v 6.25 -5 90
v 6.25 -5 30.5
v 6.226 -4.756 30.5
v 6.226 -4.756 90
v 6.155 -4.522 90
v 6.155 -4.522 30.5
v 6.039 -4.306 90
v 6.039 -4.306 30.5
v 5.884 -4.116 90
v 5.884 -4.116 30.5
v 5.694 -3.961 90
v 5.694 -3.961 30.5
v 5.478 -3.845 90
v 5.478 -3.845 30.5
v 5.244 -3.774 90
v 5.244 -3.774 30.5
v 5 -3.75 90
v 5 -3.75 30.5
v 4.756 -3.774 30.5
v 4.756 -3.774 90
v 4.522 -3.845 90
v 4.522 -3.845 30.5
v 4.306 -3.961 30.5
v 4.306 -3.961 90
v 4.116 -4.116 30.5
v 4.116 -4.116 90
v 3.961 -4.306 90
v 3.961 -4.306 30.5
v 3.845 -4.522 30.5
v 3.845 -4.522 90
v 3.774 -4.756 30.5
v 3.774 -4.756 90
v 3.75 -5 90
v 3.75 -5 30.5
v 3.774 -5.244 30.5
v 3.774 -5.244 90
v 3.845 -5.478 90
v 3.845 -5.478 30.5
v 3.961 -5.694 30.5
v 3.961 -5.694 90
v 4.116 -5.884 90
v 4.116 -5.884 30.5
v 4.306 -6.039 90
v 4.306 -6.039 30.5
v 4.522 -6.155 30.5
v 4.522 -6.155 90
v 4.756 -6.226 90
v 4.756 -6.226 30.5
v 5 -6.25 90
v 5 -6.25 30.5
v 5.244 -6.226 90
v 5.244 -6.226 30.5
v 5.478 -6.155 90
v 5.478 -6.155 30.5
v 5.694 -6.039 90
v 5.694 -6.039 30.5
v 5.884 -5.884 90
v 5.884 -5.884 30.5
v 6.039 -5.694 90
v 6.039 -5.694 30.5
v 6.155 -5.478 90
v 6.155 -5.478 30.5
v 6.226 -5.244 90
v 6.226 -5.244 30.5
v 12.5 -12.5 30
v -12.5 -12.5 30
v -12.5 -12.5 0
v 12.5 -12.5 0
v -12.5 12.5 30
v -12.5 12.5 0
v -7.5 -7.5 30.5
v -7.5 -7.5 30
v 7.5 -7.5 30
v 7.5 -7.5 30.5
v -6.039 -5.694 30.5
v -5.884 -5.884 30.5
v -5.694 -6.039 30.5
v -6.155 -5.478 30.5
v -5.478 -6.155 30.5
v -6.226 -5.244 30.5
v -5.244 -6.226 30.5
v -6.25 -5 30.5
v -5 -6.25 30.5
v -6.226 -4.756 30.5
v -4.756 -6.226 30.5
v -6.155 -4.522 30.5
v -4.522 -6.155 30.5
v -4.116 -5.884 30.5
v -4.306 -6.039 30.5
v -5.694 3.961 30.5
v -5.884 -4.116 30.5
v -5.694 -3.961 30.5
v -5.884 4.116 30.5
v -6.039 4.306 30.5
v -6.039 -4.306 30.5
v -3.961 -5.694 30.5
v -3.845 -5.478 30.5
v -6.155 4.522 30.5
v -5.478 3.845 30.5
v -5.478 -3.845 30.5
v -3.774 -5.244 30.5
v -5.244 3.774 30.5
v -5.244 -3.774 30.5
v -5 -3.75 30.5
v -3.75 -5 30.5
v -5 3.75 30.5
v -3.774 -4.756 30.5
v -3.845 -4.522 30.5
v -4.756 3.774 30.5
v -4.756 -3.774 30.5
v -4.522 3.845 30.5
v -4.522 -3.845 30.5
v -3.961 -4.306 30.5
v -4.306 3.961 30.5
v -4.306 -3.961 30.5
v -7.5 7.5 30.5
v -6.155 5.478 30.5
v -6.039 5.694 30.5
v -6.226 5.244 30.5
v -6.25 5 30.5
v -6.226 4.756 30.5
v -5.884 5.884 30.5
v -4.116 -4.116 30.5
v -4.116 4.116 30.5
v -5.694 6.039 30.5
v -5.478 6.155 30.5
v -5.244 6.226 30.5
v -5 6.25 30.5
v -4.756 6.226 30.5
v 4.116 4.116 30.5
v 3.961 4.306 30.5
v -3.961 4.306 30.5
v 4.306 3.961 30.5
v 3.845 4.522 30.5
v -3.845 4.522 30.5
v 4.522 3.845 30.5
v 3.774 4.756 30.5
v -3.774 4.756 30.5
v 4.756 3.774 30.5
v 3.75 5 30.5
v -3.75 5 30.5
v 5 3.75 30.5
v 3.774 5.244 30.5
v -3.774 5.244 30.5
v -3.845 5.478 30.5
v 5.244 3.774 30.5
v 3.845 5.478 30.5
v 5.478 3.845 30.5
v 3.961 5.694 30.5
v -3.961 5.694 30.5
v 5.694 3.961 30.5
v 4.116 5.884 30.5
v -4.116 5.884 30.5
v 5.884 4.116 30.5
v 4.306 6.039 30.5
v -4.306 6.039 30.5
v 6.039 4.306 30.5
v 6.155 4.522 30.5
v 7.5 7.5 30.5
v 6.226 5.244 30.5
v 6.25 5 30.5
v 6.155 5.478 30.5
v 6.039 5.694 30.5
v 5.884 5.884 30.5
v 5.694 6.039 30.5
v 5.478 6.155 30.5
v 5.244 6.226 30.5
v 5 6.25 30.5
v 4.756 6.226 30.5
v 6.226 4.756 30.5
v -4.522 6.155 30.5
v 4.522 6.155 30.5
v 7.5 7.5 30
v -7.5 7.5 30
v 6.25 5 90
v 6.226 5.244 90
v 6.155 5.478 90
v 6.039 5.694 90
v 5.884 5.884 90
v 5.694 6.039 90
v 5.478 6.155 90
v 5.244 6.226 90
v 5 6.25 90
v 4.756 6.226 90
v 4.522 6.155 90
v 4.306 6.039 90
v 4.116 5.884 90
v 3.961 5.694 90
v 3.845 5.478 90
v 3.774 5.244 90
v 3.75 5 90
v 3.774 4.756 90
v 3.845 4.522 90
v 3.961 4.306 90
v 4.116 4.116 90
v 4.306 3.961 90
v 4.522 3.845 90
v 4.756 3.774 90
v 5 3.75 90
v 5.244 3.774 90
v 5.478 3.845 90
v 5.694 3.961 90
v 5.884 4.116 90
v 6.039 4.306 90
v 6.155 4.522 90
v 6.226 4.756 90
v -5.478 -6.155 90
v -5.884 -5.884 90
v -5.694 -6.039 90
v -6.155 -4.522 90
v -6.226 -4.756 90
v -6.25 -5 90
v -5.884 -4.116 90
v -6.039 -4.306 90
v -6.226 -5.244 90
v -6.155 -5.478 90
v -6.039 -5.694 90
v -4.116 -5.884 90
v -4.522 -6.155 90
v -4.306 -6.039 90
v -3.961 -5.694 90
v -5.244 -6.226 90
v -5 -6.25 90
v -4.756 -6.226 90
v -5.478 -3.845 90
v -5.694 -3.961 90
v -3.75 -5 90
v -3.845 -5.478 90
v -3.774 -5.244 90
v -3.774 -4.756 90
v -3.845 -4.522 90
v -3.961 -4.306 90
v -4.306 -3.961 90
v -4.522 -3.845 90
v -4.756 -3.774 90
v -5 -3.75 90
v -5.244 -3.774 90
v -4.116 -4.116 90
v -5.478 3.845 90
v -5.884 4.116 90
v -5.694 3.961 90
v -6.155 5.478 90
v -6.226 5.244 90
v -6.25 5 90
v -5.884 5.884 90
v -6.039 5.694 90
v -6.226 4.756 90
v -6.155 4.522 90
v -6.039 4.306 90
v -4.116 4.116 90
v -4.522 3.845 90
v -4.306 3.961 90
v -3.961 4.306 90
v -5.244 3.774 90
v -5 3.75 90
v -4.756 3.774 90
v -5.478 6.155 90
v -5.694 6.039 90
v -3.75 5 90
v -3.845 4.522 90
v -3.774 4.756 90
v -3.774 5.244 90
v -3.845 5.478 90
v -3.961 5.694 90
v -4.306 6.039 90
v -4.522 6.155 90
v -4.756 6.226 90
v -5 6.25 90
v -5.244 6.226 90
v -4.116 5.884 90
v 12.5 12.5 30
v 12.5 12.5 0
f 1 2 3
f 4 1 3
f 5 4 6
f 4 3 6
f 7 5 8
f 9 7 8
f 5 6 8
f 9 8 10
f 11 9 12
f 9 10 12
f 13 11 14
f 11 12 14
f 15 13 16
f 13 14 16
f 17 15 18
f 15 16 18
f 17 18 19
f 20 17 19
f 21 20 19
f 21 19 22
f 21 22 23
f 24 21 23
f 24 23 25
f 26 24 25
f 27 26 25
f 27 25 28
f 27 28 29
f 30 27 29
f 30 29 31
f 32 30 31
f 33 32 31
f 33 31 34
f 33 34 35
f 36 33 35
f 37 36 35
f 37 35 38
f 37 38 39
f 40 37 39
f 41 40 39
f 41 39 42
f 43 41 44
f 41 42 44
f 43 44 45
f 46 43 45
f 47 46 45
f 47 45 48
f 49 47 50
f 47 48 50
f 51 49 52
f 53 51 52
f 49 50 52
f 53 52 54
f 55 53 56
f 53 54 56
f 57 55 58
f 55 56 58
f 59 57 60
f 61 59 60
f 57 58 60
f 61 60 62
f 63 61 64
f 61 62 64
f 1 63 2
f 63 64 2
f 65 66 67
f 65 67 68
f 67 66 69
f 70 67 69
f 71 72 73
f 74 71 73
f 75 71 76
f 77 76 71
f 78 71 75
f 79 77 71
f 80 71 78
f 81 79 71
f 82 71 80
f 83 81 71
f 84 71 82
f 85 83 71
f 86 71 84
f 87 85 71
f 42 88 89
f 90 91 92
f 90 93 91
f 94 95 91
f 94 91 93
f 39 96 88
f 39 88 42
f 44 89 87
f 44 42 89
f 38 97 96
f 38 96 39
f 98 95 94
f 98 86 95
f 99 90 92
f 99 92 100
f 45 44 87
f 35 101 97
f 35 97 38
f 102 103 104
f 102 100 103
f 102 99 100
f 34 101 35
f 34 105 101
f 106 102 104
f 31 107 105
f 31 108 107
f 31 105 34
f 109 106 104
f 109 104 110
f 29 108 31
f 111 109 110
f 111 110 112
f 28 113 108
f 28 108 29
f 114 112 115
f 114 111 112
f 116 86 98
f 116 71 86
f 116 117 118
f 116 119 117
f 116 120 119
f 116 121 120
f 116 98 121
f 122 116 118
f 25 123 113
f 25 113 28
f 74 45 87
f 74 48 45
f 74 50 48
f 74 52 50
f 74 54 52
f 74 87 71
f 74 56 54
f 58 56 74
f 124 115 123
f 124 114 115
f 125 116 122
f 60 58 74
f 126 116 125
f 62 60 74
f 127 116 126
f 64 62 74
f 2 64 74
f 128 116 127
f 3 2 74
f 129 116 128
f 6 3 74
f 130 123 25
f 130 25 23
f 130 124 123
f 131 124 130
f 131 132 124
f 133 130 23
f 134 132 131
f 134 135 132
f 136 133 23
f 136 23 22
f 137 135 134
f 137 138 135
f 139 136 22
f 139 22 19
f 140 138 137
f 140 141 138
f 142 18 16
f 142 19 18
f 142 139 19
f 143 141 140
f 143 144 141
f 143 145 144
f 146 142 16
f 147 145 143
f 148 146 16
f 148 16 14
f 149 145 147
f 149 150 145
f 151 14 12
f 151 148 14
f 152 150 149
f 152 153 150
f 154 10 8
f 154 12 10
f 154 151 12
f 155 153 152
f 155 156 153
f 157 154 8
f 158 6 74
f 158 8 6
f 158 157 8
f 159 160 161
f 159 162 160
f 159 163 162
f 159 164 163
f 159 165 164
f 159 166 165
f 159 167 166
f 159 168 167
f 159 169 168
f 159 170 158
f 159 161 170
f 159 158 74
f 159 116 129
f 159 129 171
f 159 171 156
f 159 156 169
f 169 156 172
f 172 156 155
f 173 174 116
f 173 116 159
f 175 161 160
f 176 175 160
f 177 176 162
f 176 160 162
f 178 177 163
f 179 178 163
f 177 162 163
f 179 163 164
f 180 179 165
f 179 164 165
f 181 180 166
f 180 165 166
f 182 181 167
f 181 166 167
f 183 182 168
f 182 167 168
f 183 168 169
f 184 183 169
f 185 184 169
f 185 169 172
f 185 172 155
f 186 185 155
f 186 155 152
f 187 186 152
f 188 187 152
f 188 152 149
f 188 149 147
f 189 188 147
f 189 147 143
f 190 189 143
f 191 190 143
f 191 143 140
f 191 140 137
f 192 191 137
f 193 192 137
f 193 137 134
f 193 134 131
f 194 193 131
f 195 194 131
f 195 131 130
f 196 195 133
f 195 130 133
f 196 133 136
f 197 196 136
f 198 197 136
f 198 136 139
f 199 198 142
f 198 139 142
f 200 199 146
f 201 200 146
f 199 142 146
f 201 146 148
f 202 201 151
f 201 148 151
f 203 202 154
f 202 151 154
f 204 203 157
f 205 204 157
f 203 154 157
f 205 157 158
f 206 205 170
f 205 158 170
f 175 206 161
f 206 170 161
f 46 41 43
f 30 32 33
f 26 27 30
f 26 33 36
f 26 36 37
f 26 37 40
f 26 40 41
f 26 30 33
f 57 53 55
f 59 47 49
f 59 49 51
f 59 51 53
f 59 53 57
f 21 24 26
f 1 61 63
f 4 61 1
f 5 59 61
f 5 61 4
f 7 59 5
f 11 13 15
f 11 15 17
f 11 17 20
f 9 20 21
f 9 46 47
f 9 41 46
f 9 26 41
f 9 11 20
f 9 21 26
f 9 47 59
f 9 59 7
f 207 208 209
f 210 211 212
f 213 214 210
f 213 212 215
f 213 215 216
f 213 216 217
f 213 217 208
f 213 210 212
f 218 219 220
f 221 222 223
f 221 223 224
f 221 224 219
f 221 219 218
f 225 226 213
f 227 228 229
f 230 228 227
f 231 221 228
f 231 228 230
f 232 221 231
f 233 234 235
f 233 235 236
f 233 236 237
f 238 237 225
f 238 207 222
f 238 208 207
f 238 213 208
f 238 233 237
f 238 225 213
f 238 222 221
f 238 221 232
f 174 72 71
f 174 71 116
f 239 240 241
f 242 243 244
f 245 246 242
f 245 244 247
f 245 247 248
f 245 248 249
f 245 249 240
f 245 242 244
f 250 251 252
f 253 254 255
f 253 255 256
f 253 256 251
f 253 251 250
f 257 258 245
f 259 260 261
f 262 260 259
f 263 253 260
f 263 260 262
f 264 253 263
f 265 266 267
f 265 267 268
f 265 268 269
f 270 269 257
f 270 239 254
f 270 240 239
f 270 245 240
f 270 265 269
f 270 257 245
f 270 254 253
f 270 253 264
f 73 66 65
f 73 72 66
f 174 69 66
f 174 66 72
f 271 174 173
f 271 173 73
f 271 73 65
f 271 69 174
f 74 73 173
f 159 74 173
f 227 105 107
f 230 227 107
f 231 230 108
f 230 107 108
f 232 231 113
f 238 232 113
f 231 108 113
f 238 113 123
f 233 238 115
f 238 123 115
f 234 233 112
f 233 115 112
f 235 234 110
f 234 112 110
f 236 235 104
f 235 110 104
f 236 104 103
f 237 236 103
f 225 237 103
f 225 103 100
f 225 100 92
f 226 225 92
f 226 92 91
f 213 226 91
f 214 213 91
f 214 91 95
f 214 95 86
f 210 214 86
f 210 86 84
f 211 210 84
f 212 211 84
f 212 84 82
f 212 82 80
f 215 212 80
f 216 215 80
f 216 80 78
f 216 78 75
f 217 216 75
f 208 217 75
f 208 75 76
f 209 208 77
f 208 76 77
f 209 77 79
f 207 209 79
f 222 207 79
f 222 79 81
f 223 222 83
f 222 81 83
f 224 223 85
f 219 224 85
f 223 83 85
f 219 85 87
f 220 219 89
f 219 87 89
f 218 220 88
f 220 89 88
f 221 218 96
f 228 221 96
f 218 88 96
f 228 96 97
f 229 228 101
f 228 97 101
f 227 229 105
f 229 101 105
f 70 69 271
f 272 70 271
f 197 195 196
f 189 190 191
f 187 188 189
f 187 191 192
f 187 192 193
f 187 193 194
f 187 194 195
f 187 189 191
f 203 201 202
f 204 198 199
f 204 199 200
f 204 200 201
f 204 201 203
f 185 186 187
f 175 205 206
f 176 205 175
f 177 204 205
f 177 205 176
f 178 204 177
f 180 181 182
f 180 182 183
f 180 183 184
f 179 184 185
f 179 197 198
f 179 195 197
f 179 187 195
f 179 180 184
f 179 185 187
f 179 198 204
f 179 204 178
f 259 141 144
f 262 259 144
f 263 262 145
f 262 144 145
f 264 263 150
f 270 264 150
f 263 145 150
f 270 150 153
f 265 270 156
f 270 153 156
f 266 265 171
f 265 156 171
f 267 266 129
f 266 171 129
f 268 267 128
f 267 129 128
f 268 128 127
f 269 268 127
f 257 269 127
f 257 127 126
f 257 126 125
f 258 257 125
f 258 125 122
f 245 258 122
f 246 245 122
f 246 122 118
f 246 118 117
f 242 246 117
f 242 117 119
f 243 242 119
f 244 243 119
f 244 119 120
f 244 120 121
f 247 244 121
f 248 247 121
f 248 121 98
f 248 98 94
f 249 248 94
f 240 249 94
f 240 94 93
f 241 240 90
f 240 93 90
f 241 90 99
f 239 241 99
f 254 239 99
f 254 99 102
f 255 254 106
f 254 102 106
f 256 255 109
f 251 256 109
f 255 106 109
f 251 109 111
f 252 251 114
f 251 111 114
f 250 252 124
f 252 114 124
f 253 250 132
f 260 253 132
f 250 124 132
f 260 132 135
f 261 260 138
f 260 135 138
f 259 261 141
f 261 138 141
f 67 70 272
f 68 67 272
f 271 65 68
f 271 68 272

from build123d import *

# Parameters (mm, degrees)
F0_W     = 25
F0_H     = 25
F1_DEPTH = 30
F2_R     = 1.25
F3_DEPTH = 60
F2_W     = 15
F2_H     = 15
F4_DEPTH = 0.5


with BuildPart() as f1:
    # F0 (on Top) → F1 (new body)
    with BuildSketch(Plane.XY):
        Rectangle(F0_W, F0_H)
    extrude(amount=F1_DEPTH)

    # F2 (on face) → F3 (join)
    with BuildSketch(Plane.XY.offset(30)):
        with Locations((-5, 5)):
            Circle(F2_R)
        with Locations((5, 5)):
            Circle(F2_R)
        with Locations((-5, -5)):
            Circle(F2_R)
        with Locations((5, -5)):
            Circle(F2_R)
    extrude(amount=F3_DEPTH)

    # F2 (on face) → F4 (join)
    with BuildSketch(Plane.XY.offset(30)):
        Rectangle(F2_W, F2_H)
        with Locations((-5, -5)):
            Circle(F2_R, mode=Mode.SUBTRACT)
        with Locations((5, -5)):
            Circle(F2_R, mode=Mode.SUBTRACT)
        with Locations((-5, 5)):
            Circle(F2_R, mode=Mode.SUBTRACT)
        with Locations((5, 5)):
            Circle(F2_R, mode=Mode.SUBTRACT)
    extrude(amount=F4_DEPTH)


solid = f1.part
